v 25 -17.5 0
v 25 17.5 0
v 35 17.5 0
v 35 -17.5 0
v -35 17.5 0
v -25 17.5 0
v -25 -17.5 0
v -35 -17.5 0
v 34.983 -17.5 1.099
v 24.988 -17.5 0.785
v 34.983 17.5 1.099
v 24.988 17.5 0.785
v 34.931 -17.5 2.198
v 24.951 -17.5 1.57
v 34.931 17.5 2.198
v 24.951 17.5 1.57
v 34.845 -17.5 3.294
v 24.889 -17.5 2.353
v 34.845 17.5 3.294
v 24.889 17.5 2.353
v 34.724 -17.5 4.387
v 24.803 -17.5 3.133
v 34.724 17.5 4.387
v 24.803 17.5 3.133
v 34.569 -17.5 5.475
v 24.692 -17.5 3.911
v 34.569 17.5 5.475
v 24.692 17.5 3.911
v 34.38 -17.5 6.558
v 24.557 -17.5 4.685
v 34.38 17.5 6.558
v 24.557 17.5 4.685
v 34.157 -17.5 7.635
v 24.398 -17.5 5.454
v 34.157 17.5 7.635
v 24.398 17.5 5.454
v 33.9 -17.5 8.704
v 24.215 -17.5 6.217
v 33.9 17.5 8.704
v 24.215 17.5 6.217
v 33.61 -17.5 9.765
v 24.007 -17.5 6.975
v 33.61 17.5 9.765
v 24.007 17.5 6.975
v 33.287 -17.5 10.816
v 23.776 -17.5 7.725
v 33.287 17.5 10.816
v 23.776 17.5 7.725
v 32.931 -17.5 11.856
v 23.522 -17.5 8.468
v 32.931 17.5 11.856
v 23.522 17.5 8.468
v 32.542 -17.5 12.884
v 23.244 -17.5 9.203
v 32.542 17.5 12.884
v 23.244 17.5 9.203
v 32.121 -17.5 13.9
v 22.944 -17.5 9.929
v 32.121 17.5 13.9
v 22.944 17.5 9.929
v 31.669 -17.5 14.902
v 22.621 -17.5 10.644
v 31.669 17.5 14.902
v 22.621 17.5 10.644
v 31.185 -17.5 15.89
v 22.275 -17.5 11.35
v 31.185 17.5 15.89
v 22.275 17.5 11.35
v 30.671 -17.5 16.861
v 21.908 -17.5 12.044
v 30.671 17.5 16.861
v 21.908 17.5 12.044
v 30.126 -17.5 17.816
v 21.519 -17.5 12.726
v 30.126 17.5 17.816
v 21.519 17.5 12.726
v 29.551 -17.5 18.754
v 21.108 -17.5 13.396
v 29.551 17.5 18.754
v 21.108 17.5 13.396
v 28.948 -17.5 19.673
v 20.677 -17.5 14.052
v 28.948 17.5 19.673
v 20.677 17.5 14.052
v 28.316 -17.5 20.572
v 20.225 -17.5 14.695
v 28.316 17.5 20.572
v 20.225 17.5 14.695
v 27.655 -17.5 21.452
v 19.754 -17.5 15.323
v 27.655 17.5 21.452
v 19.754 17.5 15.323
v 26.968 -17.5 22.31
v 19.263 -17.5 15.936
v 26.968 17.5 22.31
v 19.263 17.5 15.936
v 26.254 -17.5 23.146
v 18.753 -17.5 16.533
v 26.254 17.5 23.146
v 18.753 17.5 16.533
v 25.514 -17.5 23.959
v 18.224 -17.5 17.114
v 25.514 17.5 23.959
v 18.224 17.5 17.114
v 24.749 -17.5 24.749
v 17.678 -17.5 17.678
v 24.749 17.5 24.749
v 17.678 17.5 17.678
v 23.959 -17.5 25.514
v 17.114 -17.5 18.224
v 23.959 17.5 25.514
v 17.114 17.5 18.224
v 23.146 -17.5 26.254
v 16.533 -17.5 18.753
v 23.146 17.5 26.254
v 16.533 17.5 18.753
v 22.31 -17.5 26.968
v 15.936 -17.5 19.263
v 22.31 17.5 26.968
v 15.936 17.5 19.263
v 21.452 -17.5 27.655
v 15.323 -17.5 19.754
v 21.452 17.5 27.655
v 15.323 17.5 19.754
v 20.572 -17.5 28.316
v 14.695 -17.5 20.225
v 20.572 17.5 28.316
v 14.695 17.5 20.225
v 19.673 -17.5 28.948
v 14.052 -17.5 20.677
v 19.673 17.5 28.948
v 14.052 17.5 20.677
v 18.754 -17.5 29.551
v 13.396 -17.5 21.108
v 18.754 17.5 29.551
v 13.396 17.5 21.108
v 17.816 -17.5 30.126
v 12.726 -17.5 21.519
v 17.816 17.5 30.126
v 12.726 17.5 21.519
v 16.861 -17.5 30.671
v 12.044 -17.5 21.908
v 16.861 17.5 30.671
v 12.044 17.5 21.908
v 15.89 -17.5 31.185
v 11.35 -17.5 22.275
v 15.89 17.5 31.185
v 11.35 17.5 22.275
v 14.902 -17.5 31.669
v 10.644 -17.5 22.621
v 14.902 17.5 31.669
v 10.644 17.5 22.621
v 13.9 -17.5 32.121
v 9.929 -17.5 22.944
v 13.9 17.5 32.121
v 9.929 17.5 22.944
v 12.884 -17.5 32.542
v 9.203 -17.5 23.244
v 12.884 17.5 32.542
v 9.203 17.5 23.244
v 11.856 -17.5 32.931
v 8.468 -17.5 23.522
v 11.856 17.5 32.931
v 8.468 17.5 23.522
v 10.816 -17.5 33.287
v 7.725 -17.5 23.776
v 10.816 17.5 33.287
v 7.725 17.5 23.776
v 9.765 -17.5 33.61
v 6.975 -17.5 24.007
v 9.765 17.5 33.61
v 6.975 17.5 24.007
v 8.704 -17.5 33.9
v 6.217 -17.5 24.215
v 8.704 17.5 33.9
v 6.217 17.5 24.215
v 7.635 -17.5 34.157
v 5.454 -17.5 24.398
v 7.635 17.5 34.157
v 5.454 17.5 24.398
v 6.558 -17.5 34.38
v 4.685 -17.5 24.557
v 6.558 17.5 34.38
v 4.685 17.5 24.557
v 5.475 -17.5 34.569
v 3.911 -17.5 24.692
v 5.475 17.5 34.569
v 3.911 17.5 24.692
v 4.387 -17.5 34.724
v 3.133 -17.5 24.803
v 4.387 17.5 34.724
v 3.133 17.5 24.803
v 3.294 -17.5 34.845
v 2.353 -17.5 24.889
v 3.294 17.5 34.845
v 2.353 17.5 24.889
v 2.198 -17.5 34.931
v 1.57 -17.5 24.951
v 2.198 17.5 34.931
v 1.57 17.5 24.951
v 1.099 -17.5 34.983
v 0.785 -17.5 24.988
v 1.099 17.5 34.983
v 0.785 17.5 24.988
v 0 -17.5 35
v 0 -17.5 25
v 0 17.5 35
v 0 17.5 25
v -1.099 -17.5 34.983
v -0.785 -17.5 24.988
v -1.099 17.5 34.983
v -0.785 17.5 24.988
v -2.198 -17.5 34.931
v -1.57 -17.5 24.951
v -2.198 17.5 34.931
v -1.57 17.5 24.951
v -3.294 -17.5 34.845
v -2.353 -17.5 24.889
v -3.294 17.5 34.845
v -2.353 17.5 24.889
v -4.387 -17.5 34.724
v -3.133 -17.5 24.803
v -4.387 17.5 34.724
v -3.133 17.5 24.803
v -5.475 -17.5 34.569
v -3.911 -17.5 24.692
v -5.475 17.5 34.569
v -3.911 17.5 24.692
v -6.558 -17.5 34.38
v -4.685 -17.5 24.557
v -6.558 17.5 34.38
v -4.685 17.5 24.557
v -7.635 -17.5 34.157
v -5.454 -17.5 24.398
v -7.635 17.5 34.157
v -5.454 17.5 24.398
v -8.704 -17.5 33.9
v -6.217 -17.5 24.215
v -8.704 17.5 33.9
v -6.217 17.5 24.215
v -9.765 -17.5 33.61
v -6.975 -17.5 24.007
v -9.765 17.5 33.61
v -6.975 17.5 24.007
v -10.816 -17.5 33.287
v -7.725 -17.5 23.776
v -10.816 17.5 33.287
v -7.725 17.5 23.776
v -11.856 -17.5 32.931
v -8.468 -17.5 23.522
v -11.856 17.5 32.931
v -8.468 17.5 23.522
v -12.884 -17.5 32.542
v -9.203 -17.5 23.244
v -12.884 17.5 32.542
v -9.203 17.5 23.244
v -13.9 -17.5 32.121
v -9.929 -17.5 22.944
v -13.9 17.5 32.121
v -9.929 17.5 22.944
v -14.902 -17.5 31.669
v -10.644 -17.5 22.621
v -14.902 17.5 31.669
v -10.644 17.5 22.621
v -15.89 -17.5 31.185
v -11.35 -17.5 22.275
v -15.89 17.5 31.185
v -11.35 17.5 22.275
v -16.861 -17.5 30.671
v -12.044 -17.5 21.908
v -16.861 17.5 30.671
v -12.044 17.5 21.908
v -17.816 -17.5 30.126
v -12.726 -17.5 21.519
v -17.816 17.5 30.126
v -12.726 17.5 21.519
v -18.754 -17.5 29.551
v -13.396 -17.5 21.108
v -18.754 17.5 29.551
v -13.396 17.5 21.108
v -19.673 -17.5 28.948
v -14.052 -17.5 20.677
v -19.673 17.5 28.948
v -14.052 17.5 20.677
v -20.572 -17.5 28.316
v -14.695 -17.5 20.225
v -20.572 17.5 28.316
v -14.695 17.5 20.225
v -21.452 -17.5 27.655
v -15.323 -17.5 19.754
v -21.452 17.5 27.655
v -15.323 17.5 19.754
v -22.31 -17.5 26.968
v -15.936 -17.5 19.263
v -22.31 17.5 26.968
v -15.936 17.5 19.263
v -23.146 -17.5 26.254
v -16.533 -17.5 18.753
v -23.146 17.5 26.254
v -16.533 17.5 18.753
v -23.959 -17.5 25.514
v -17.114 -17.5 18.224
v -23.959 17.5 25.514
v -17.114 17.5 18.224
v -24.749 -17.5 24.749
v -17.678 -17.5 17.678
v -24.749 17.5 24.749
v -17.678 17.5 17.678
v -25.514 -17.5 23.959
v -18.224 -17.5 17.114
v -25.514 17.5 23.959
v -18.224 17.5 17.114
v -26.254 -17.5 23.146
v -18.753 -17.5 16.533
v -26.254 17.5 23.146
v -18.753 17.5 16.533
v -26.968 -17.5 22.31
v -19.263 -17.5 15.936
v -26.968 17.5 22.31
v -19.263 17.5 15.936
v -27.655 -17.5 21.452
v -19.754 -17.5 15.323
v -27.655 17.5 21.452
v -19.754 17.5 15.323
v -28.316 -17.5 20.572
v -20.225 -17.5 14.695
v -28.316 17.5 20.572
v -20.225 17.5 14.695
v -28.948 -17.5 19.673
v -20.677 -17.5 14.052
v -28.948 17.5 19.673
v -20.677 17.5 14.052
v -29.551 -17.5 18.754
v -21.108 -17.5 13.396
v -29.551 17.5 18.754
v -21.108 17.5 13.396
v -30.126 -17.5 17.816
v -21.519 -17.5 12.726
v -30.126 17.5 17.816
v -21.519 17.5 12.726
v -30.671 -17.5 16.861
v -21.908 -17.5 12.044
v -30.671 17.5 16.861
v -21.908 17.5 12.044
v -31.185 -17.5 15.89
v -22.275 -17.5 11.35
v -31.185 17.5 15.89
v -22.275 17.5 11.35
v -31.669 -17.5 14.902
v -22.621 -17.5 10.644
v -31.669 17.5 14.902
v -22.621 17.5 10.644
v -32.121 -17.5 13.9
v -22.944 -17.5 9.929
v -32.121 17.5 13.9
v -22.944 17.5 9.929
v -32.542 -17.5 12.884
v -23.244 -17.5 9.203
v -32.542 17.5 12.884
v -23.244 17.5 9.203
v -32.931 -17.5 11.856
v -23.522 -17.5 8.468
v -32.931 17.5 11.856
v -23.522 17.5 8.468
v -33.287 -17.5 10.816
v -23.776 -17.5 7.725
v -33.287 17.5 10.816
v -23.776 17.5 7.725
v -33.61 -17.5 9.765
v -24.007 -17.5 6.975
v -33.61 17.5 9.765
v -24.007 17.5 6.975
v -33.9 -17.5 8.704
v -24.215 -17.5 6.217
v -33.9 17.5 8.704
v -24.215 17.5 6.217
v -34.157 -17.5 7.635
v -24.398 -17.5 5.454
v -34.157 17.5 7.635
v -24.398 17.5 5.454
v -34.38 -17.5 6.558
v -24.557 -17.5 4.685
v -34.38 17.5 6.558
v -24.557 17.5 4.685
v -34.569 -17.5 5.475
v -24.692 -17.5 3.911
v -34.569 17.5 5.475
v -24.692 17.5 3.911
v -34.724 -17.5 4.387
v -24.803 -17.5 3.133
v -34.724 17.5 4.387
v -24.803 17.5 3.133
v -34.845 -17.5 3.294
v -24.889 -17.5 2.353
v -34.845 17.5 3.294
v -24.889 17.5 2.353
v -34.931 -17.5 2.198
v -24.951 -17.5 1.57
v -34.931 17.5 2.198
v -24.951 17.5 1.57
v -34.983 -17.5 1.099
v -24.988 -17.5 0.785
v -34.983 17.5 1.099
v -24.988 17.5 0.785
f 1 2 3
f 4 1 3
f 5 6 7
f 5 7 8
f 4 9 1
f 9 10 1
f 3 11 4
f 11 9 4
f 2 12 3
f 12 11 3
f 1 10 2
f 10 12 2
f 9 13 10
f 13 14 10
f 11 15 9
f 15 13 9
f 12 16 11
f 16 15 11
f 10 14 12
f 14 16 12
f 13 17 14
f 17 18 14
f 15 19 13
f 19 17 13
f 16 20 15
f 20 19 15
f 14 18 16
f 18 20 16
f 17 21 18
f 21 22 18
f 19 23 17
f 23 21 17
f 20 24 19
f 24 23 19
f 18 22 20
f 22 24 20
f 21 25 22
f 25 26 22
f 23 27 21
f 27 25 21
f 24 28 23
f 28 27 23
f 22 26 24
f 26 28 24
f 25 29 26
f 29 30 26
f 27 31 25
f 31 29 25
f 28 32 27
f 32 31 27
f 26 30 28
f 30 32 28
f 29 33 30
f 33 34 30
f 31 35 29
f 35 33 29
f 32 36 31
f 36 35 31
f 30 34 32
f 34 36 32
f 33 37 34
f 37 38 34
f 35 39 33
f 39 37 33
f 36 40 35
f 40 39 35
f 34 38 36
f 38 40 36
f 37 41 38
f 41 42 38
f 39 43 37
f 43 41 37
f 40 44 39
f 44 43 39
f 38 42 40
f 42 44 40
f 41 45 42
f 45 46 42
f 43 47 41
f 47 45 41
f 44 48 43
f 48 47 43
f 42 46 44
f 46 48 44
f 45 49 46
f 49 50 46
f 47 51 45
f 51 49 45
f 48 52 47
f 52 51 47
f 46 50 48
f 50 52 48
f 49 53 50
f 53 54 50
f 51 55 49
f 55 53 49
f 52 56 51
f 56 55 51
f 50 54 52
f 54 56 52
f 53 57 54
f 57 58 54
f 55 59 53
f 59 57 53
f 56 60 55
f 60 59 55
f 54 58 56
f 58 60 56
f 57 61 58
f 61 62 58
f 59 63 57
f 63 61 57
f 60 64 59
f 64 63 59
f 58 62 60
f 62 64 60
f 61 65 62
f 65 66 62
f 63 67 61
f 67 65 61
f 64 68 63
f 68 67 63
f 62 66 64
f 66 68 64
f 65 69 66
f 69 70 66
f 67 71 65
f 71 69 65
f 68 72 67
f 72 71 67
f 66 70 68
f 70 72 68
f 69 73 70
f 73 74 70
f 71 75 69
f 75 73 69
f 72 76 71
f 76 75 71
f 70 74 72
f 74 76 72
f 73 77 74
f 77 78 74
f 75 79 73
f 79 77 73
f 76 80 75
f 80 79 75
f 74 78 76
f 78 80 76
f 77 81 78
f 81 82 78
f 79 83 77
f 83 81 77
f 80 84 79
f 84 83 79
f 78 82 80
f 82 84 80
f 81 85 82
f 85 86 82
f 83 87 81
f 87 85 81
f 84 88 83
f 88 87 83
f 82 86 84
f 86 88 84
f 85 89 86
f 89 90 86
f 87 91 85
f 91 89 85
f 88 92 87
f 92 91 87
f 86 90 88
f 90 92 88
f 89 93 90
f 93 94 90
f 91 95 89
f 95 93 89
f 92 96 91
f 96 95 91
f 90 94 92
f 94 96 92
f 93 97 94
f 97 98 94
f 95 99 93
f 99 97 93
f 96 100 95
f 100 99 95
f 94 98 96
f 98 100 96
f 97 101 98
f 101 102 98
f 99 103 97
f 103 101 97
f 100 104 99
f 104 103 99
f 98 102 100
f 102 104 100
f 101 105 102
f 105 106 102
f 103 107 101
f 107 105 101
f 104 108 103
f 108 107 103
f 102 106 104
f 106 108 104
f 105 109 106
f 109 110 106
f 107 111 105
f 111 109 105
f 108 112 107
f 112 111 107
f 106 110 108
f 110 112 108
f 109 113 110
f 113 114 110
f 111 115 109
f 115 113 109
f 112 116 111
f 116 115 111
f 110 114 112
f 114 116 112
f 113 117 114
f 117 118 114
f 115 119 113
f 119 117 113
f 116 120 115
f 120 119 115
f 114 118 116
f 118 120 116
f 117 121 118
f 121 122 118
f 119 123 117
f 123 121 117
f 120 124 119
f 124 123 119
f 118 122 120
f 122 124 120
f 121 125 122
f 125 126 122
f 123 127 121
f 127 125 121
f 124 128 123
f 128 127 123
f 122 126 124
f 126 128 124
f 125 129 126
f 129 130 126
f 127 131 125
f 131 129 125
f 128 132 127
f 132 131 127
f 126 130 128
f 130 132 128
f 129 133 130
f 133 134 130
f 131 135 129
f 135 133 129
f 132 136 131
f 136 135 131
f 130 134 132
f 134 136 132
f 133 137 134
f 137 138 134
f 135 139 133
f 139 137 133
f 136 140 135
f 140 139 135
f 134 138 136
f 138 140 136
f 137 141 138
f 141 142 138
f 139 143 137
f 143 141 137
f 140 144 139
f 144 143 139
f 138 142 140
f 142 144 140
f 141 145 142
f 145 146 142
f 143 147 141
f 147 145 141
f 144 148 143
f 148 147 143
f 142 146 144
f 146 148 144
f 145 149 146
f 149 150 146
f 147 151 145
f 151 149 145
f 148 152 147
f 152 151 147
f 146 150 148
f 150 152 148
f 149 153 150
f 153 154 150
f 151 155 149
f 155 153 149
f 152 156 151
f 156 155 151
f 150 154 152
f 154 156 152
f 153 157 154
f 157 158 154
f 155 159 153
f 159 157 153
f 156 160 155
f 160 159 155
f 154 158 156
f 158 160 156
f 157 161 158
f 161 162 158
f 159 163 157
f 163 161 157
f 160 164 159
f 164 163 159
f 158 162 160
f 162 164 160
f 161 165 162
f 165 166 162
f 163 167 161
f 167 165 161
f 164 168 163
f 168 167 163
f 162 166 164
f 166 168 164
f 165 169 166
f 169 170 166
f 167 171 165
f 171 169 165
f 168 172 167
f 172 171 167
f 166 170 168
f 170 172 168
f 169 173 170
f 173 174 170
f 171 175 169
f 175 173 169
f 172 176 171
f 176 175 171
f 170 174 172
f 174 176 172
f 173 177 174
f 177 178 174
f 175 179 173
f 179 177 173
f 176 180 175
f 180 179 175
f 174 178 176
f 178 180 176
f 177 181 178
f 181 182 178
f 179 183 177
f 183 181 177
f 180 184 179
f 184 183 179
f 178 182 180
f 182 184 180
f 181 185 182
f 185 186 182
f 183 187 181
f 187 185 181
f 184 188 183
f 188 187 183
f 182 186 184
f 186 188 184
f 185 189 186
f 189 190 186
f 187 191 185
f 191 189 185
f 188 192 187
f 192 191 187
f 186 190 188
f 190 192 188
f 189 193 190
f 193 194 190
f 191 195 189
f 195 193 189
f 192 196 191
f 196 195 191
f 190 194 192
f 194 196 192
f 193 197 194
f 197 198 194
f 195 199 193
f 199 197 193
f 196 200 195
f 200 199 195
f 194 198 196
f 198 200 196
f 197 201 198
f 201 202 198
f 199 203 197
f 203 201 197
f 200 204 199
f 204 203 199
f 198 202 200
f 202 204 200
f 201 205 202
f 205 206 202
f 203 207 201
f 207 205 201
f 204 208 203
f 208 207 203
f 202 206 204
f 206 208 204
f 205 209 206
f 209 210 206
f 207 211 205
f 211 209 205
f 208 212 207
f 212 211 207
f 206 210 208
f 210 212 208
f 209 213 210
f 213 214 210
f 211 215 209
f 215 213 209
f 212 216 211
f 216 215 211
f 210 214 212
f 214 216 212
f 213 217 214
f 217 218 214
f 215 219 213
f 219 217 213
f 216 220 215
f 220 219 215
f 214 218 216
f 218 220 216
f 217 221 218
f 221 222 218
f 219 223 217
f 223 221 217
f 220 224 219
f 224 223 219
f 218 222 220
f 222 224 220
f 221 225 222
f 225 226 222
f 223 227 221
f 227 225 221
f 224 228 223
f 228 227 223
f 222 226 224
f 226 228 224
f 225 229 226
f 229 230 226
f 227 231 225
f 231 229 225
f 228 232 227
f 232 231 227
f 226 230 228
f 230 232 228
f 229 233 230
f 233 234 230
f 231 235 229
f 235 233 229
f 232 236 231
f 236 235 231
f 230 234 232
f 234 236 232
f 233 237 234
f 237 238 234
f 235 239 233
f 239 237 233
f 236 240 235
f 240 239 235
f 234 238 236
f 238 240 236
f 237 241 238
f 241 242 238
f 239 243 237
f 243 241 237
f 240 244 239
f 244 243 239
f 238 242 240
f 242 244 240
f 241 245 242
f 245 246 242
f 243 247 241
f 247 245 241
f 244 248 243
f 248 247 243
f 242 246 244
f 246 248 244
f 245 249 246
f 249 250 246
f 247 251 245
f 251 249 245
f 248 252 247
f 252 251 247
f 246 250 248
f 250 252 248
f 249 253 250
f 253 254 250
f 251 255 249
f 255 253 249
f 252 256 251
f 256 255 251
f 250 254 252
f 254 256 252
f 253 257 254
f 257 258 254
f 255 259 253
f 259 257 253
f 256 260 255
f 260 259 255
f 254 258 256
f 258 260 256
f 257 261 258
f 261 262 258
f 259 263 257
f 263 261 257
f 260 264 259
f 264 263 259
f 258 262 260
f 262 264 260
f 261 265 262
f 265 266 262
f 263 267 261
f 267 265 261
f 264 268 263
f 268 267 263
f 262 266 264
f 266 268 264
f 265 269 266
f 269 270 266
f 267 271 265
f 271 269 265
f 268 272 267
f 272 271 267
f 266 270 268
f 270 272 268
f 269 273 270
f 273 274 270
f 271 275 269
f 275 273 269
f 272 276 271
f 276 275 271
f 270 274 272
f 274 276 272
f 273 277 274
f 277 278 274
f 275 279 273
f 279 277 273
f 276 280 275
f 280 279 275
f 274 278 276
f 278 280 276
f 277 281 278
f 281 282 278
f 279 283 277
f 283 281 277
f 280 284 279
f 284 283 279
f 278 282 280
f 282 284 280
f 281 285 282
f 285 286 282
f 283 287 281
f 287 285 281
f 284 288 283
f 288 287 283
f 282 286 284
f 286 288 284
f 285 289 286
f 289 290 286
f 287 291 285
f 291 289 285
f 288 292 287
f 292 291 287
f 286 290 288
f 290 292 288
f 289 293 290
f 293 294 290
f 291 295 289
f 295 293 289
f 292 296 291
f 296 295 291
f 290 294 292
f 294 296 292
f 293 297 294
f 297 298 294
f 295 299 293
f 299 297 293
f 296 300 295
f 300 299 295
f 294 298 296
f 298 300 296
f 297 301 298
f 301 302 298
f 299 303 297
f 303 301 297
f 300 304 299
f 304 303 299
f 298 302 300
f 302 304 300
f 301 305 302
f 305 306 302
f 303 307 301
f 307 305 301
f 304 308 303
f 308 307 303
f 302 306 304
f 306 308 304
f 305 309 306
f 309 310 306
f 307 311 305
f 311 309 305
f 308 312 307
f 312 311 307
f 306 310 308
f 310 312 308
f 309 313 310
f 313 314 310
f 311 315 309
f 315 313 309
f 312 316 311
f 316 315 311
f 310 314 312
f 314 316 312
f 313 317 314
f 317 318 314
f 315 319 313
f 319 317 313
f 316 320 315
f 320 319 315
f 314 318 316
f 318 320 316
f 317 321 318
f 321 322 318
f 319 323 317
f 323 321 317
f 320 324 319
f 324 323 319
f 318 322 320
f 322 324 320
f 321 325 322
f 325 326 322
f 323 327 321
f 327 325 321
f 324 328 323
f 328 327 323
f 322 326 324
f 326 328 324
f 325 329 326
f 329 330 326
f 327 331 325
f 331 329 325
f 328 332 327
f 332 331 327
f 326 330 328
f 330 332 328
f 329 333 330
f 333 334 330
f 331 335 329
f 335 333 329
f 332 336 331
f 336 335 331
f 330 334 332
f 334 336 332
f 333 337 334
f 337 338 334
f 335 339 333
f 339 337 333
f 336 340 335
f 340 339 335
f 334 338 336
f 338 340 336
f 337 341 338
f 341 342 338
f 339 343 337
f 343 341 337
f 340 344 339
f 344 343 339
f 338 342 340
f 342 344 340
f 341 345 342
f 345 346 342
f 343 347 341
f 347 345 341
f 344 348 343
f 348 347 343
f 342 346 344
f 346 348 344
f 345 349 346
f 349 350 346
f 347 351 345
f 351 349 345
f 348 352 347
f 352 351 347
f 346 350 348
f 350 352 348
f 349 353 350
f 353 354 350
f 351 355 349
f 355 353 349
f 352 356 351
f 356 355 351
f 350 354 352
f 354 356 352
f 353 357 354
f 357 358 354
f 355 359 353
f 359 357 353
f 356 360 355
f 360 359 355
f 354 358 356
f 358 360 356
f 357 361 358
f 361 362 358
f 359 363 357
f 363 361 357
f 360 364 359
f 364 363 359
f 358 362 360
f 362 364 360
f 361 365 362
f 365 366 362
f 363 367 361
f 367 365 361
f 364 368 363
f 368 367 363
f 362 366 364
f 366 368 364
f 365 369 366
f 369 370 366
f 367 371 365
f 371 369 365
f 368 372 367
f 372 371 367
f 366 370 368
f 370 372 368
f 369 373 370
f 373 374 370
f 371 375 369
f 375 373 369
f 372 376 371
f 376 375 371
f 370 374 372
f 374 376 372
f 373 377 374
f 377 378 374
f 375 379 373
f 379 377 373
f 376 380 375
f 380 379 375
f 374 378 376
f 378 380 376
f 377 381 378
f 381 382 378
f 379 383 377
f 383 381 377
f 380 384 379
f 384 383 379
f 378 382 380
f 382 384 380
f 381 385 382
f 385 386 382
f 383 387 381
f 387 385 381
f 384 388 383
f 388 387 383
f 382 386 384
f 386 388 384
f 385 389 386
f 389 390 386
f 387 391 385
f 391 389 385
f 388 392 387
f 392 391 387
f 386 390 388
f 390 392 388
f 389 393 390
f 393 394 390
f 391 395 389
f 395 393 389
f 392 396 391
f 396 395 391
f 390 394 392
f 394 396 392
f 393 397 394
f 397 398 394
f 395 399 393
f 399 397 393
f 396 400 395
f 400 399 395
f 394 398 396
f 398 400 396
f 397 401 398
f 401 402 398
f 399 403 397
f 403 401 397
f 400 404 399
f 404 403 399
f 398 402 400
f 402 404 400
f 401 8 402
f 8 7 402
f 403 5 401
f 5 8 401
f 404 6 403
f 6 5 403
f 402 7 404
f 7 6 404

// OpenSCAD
width = 35;
outer_radius = 35;
inner_radius = 25;
thickness = outer_radius - inner_radius;

rotate([90, 0, 0])
rotate_extrude(angle=180, $fn=200)
translate([inner_radius, -width/2, 0])
square([thickness, width]);
